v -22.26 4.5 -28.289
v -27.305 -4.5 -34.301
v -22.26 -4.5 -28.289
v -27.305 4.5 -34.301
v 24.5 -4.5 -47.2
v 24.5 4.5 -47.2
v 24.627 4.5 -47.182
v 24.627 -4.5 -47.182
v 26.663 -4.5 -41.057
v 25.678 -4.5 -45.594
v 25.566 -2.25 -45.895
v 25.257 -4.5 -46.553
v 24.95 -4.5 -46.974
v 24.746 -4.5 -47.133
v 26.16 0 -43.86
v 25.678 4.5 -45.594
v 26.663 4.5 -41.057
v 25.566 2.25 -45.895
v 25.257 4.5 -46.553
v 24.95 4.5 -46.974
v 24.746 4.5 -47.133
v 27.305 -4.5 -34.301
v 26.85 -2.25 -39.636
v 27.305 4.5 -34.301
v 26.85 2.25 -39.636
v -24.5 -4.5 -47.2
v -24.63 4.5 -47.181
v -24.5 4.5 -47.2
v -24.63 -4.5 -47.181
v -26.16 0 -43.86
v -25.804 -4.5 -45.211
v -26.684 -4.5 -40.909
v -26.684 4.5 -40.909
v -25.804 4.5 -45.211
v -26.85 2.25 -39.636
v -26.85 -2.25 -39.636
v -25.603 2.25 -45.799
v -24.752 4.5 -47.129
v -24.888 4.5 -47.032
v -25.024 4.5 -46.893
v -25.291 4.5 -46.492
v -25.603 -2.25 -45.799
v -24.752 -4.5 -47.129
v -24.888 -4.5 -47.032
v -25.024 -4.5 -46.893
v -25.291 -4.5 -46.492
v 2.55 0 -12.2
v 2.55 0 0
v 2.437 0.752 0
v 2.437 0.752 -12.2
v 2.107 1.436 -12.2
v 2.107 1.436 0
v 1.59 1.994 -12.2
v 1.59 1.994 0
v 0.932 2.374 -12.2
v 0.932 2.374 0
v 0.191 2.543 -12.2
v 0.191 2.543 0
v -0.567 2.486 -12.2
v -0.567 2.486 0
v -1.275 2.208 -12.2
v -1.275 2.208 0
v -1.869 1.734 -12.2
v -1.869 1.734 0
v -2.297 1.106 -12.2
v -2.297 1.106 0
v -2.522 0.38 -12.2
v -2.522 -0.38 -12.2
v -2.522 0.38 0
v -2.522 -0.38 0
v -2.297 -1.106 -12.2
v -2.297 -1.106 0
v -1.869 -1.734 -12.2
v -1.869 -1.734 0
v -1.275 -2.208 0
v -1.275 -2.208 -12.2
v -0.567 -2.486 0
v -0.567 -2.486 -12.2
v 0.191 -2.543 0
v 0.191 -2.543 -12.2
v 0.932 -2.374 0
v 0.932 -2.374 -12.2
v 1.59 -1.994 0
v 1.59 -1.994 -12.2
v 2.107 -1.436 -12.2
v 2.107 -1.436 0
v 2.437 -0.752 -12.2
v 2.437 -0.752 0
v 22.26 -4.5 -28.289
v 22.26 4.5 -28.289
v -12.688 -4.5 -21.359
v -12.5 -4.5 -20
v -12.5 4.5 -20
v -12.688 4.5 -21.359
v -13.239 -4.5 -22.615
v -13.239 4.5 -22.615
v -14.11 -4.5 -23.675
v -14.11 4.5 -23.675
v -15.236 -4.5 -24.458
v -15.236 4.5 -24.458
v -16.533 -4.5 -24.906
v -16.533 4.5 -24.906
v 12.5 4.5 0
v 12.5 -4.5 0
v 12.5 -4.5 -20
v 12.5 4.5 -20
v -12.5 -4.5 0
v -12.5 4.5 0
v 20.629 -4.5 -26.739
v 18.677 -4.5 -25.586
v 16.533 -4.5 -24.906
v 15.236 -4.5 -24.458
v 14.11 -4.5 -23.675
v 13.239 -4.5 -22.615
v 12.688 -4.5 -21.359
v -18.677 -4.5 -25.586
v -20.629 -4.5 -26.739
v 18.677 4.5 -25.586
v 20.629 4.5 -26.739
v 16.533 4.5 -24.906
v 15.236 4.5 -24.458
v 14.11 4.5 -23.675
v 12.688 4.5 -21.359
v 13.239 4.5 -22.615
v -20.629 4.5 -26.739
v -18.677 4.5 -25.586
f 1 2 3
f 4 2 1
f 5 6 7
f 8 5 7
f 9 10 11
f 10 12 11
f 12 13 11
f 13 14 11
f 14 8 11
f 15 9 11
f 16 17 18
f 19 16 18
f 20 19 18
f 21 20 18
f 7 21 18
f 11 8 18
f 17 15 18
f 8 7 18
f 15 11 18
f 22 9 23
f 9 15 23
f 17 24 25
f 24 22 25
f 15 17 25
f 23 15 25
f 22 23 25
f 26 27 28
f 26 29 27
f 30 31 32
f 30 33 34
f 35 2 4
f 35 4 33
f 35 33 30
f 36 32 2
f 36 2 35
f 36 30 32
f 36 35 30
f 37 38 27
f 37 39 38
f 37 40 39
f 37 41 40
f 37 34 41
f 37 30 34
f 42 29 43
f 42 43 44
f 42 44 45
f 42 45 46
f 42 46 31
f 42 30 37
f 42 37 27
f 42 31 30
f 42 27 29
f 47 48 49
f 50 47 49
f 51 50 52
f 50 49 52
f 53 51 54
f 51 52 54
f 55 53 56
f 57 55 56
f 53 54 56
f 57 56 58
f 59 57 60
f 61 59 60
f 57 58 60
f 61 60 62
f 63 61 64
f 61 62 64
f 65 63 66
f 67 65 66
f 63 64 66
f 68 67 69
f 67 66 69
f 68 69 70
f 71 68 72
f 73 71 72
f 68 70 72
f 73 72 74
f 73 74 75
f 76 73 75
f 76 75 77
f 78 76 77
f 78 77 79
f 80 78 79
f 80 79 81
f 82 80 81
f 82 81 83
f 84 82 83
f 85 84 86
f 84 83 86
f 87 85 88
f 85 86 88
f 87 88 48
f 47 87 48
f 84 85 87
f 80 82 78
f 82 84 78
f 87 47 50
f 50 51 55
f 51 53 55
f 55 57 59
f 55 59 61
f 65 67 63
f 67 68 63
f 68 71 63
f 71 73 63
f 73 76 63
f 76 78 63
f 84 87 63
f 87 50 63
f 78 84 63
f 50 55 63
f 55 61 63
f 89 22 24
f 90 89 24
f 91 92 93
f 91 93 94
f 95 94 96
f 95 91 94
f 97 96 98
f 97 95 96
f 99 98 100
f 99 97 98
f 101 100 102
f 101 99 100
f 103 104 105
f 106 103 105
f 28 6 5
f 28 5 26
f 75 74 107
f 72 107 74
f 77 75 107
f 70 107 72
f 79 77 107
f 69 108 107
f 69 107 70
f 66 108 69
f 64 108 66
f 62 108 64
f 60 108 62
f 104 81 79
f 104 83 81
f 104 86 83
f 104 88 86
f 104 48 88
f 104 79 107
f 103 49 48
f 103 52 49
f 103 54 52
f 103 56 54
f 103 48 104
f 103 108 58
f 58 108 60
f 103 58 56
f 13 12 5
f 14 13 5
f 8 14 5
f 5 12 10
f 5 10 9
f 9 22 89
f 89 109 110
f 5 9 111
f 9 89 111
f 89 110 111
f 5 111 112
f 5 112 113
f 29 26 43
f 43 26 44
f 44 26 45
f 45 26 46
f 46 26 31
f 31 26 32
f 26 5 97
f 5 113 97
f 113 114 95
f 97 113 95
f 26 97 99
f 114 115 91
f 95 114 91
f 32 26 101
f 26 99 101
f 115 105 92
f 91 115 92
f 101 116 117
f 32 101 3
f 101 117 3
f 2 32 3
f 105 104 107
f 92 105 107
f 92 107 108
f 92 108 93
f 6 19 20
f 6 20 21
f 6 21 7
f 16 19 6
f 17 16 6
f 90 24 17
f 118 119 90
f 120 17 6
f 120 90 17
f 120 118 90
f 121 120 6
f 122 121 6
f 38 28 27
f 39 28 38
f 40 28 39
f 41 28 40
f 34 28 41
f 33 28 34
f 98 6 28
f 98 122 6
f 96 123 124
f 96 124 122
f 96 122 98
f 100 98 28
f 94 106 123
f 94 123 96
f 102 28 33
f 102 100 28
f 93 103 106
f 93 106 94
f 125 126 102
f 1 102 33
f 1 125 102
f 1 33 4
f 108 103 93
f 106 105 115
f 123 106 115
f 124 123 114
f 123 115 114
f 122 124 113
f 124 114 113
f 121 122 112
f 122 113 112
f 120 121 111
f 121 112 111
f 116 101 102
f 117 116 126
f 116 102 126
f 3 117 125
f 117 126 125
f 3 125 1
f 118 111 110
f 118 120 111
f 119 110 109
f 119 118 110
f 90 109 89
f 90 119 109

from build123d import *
from OCP.BRepFilletAPI import BRepFilletAPI_MakeChamfer

# Parameters (mm, degrees)
SKETCH2_W           = 55
SKETCH2_H           = 9
SKETCH2_R           = 2.55
BOSS_EXTRUDE1_DEPTH = 12.2
SKETCH3_W           = 55
SKETCH3_H           = 9
BOSS_EXTRUDE2_DEPTH = 35
CUT_EXTRUDE1_REACH  = 57.363
CHAMFER1_SIZE       = 8
CHAMFER1_SIZE2      = 9.534028741
FILLET1_SIZE        = 20
FILLET1_SIZE_2      = 3
FILLET2_R           = 10


with BuildPart() as part:
    # Sketch2 → Boss-Extrude1 (new body)
    with BuildSketch(Plane.XY):
        Rectangle(SKETCH2_W, SKETCH2_H)
        Circle(SKETCH2_R, mode=Mode.SUBTRACT)
    extrude(amount=-BOSS_EXTRUDE1_DEPTH)

    # Sketch3 → Boss-Extrude2 (add)
    with BuildSketch(Plane(origin=(0, 0, -12.2), x_dir=(-1, 0, 0), z_dir=(0, 0, -1))):
        Rectangle(SKETCH3_W, SKETCH3_H)
    extrude(amount=BOSS_EXTRUDE2_DEPTH)

    # Sketch5 → Cut-Extrude1 (cut, up to next)
    with BuildSketch(Plane.XZ.offset(4.5), mode=Mode.PRIVATE) as cut_extrude1_sk1:
        with BuildLine():
            Line((27.5, 0), (12.5, 0))
            Line((12.5, 0), (12.5, -20))
            ThreePointArc((12.5, -20), (13.964466094, -23.535533906), (17.5, -25))
            Line((17.5, -25), (27.5, -25))
            Line((27.5, -25), (27.5, 0))
        make_face()
    cut_extrude1_tool1 = extrude(cut_extrude1_sk1.sketch, amount=-CUT_EXTRUDE1_REACH, mode=Mode.PRIVATE) & part.part
    # Sketch5 → Cut-Extrude1 (cut, up to next)
    with BuildSketch(Plane.XZ.offset(4.5), mode=Mode.PRIVATE) as cut_extrude1_sk2:
        with BuildLine():
            Line((-12.5, 0), (-12.5, -20))
            ThreePointArc((-12.5, -20), (-13.964466094, -23.535533906), (-17.5, -25))
            Line((-17.5, -25), (-27.5, -25))
            Line((-27.5, -25), (-27.5, 0))
            Line((-27.5, 0), (-12.5, 0))
        make_face()
    cut_extrude1_tool2 = extrude(cut_extrude1_sk2.sketch, amount=-CUT_EXTRUDE1_REACH, mode=Mode.PRIVATE) & part.part
    add(cut_extrude1_tool1.solids().sort_by_distance((20.092648, -4.5, -12.33478))[0], mode=Mode.SUBTRACT)
    add(cut_extrude1_tool2.solids().sort_by_distance((-20.092648, -4.5, -12.33478))[0], mode=Mode.SUBTRACT)

    # Chamfer1: one chamfer whose edges measure the first distance from different faces: ONE call of the kernel's chamfer builder (chamfer() names one face for all edges)
    chamfer1_edges_1 = [part.edges().sort_by_distance(p)[0] for p in [
        (27.5, 0, -25),
    ]]
    chamfer1_side_1 = [part.faces().sort_by_distance(p)[0] for p in [
        (22.5, 0, -25),
    ]]
    chamfer1_edges_2 = [part.edges().sort_by_distance(p)[0] for p in [
        (-27.5, 0, -25),
    ]]
    chamfer1_side_2 = [part.faces().sort_by_distance(p)[0] for p in [
        (-22.5, 0, -25),
    ]]
    chamfer1 = BRepFilletAPI_MakeChamfer(part.part.solid().wrapped)
    for e in chamfer1_edges_1:
        chamfer1.Add(CHAMFER1_SIZE, CHAMFER1_SIZE2, e.wrapped, chamfer1_side_1[0].wrapped)  # the first distance lies on this face
    for e in chamfer1_edges_2:
        chamfer1.Add(CHAMFER1_SIZE, CHAMFER1_SIZE2, e.wrapped, chamfer1_side_2[0].wrapped)  # the first distance lies on this face
    add(Compound.cast(chamfer1.Shape()), mode=Mode.REPLACE)

    # Fillet1
    # an asymmetric fillet: 20, 3 mm, written as the material it takes off along each edge
    with BuildSketch(Plane(origin=(-27.5, -54.5, -47.2), x_dir=(0, 0, 1), z_dir=(0, 1, 0))) as fillet1_piece_1:
        with BuildLine():
            Bezier((FILLET1_SIZE, 0), (0, 0), (0, FILLET1_SIZE_2), weights=[1, 0.707106781, 1])
            Line((0, FILLET1_SIZE_2), (0, 0))
            Line((0, 0), (FILLET1_SIZE, 0))
        make_face()
    extrude(amount=109, mode=Mode.SUBTRACT)
    with BuildSketch(Plane(origin=(27.5, 54.5, -47.2), x_dir=(-1, 0, 0), z_dir=(0, -1, 0))) as fillet1_piece_2:
        with BuildLine():
            Bezier((FILLET1_SIZE_2, 0), (0, 0), (0, -FILLET1_SIZE), weights=[1, 0.707106781, 1])
            Line((0, -FILLET1_SIZE), (0, 0))
            Line((0, 0), (FILLET1_SIZE_2, 0))
        make_face()
    extrude(amount=109, mode=Mode.SUBTRACT)

    # Fillet2
    fillet2_edges = [part.edges().sort_by_distance(p)[0] for p in [
        (19.5, 0, -25),
        (-19.5, 0, -25),
    ]]
    fillet(fillet2_edges, radius=FILLET2_R)


solid = part.part
